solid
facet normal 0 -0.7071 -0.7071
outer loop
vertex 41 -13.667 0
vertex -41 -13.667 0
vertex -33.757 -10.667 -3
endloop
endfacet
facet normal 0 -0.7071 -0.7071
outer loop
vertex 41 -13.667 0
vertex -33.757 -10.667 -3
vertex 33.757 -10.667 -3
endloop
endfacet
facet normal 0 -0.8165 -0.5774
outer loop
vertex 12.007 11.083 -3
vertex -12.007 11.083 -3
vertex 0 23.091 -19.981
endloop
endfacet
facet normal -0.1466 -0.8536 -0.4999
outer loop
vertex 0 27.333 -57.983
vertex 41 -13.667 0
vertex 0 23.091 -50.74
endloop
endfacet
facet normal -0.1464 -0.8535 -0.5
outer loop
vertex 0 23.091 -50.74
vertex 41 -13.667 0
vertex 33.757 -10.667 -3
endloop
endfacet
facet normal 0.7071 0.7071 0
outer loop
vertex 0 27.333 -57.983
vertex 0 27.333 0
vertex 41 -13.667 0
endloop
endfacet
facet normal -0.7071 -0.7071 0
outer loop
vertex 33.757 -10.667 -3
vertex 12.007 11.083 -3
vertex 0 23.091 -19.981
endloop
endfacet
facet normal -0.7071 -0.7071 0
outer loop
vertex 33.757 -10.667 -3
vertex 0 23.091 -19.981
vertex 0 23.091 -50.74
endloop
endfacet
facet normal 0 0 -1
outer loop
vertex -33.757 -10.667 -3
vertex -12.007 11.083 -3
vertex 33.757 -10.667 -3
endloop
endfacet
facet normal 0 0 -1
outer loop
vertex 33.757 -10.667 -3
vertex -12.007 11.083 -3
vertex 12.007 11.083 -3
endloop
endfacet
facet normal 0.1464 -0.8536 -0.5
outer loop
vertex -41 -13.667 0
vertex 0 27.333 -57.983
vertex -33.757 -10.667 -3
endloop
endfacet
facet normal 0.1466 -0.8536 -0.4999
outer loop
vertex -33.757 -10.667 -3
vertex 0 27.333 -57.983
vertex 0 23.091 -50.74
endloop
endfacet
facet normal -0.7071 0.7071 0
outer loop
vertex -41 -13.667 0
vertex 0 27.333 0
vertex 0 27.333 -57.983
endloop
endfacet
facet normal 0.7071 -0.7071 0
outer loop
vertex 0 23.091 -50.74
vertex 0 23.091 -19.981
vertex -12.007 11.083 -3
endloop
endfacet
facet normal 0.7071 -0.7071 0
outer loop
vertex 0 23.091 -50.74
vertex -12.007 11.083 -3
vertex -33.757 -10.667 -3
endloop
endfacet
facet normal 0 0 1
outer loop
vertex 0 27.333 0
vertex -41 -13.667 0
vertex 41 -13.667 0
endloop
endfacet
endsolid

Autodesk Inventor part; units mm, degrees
ref_plane "YZ Plane" through (0, 0, 0) normal (1, 0, 0) x (0, 1, 0)
sketch "Sketch3" plane through (0, 0, 0) normal (0, 0, 1) x (1, 0, 0)
  line L0 (0, 27.3333) -> (-41, -13.6667)
  line L1 (-41, -13.6667) -> (41, -13.6667)
  line L2 (41, -13.6667) -> (0, 27.3333)
  line L3 (41, -13.6667) -> (-20.5, 6.8333) construction
  line L4 (-41, -13.6667) -> (20.5, 6.8333) construction
  point P0 (0, 0)
  dimension "d7" = 90
  dimension "d8" = 45
  dimension "d9" = 82
extrude "Extrusion1" add sketch "Sketch3" against normal blind 3 draft -45
sketch "Sketch4" plane through (0, 0, 0) normal (0, 0, 1) x (1, 0, 0)
  line L0 (-33.7574, -10.6667) -> (33.7574, -10.6667) projected
  line L1 (0, 23.0907) -> (-33.7574, -10.6667) projected
  point P0 (0, 0)
  point P1 (0, -10.6667)
ref_plane "Work Plane2" through (0, -10.6667, 0) normal (-1, 0, 0) x (0, 1, 0)
sketch "Sketch5" plane through (0, -10.6667, 0) normal (-1, 0, 0) x (0, 1, 0)
  line L0 (38, 0) -> (-3, 0) construction
  line L1 (-3, 0) -> (10.6667, 19.3276) construction
  line L2 (38, 0) -> (10.6667, 19.3276)
  line L3 (-3, 0) -> (38, 0) projected
  point P0 (10.6667, 0)
  dimension "d18" = 23.6714
pattern_circular "Circular Pattern1" count 3 over 360 about axis through (0, 27.3333, 0) along (0, -0.8164966, -0.5773503) of "Extrusion1"
sketch "Sketch6" plane through (0, -10.6667, 0) normal (-1, 0, 0) x (0, 1, 0)
  line L0 (38, 0) -> (-3, 0) projected
  line L1 (38, 0) -> (38, 57.9828) projected
  line L2 (38, 57.9828) -> (-3, 0) projected
  line L3 (38, 0) -> (-3, 0) projected
  line L4 (48.9333, -7.731) -> (-27.6, 46.3862) projected
  point P0 (10.6667, 0)
  point P1 (25.7526, 8.6603)
  dimension "d20" = 15
ref_plane "Work Plane4" through (0, 15.0859, -8.6603) normal (0, 0.8164966, 0.5773503) x (1, 0, 0)
ref_plane "Work Plane3" through (-41, -13.6667, 0) normal (0, 0.8164966, 0.5773503) x (1, 0, 0)
sketch "Sketch7" plane through (0, 15.0859, -8.6603) normal (0, 0.8164966, 0.5773503) x (1, 0, 0)
  line L0 (12.0072, -6.9324) -> (0, 13.8647) projected
  line L1 (0, 13.8647) -> (-12.0072, -6.9324) projected
  line L2 (-12.0072, -6.9324) -> (12.0072, -6.9324) projected
  line L3 (0, 21.2132) -> (18.3712, -10.6066) projected
  line L4 (18.3712, -10.6066) -> (-18.3712, -10.6066) projected
  line L5 (-18.3712, -10.6066) -> (0, 21.2132) projected
  line L6 (-12.0072, -6.9324) -> (0, 13.8647)
  line L7 (12.0072, -6.9324) -> (0, 13.8647)
  line L8 (12.0072, -6.9324) -> (-12.0072, -6.9324)
  point P0 (0, -15.7809)
extrude "Extrusion2" add sketch "Sketch7" along normal up to next contours L2 L1 L0
